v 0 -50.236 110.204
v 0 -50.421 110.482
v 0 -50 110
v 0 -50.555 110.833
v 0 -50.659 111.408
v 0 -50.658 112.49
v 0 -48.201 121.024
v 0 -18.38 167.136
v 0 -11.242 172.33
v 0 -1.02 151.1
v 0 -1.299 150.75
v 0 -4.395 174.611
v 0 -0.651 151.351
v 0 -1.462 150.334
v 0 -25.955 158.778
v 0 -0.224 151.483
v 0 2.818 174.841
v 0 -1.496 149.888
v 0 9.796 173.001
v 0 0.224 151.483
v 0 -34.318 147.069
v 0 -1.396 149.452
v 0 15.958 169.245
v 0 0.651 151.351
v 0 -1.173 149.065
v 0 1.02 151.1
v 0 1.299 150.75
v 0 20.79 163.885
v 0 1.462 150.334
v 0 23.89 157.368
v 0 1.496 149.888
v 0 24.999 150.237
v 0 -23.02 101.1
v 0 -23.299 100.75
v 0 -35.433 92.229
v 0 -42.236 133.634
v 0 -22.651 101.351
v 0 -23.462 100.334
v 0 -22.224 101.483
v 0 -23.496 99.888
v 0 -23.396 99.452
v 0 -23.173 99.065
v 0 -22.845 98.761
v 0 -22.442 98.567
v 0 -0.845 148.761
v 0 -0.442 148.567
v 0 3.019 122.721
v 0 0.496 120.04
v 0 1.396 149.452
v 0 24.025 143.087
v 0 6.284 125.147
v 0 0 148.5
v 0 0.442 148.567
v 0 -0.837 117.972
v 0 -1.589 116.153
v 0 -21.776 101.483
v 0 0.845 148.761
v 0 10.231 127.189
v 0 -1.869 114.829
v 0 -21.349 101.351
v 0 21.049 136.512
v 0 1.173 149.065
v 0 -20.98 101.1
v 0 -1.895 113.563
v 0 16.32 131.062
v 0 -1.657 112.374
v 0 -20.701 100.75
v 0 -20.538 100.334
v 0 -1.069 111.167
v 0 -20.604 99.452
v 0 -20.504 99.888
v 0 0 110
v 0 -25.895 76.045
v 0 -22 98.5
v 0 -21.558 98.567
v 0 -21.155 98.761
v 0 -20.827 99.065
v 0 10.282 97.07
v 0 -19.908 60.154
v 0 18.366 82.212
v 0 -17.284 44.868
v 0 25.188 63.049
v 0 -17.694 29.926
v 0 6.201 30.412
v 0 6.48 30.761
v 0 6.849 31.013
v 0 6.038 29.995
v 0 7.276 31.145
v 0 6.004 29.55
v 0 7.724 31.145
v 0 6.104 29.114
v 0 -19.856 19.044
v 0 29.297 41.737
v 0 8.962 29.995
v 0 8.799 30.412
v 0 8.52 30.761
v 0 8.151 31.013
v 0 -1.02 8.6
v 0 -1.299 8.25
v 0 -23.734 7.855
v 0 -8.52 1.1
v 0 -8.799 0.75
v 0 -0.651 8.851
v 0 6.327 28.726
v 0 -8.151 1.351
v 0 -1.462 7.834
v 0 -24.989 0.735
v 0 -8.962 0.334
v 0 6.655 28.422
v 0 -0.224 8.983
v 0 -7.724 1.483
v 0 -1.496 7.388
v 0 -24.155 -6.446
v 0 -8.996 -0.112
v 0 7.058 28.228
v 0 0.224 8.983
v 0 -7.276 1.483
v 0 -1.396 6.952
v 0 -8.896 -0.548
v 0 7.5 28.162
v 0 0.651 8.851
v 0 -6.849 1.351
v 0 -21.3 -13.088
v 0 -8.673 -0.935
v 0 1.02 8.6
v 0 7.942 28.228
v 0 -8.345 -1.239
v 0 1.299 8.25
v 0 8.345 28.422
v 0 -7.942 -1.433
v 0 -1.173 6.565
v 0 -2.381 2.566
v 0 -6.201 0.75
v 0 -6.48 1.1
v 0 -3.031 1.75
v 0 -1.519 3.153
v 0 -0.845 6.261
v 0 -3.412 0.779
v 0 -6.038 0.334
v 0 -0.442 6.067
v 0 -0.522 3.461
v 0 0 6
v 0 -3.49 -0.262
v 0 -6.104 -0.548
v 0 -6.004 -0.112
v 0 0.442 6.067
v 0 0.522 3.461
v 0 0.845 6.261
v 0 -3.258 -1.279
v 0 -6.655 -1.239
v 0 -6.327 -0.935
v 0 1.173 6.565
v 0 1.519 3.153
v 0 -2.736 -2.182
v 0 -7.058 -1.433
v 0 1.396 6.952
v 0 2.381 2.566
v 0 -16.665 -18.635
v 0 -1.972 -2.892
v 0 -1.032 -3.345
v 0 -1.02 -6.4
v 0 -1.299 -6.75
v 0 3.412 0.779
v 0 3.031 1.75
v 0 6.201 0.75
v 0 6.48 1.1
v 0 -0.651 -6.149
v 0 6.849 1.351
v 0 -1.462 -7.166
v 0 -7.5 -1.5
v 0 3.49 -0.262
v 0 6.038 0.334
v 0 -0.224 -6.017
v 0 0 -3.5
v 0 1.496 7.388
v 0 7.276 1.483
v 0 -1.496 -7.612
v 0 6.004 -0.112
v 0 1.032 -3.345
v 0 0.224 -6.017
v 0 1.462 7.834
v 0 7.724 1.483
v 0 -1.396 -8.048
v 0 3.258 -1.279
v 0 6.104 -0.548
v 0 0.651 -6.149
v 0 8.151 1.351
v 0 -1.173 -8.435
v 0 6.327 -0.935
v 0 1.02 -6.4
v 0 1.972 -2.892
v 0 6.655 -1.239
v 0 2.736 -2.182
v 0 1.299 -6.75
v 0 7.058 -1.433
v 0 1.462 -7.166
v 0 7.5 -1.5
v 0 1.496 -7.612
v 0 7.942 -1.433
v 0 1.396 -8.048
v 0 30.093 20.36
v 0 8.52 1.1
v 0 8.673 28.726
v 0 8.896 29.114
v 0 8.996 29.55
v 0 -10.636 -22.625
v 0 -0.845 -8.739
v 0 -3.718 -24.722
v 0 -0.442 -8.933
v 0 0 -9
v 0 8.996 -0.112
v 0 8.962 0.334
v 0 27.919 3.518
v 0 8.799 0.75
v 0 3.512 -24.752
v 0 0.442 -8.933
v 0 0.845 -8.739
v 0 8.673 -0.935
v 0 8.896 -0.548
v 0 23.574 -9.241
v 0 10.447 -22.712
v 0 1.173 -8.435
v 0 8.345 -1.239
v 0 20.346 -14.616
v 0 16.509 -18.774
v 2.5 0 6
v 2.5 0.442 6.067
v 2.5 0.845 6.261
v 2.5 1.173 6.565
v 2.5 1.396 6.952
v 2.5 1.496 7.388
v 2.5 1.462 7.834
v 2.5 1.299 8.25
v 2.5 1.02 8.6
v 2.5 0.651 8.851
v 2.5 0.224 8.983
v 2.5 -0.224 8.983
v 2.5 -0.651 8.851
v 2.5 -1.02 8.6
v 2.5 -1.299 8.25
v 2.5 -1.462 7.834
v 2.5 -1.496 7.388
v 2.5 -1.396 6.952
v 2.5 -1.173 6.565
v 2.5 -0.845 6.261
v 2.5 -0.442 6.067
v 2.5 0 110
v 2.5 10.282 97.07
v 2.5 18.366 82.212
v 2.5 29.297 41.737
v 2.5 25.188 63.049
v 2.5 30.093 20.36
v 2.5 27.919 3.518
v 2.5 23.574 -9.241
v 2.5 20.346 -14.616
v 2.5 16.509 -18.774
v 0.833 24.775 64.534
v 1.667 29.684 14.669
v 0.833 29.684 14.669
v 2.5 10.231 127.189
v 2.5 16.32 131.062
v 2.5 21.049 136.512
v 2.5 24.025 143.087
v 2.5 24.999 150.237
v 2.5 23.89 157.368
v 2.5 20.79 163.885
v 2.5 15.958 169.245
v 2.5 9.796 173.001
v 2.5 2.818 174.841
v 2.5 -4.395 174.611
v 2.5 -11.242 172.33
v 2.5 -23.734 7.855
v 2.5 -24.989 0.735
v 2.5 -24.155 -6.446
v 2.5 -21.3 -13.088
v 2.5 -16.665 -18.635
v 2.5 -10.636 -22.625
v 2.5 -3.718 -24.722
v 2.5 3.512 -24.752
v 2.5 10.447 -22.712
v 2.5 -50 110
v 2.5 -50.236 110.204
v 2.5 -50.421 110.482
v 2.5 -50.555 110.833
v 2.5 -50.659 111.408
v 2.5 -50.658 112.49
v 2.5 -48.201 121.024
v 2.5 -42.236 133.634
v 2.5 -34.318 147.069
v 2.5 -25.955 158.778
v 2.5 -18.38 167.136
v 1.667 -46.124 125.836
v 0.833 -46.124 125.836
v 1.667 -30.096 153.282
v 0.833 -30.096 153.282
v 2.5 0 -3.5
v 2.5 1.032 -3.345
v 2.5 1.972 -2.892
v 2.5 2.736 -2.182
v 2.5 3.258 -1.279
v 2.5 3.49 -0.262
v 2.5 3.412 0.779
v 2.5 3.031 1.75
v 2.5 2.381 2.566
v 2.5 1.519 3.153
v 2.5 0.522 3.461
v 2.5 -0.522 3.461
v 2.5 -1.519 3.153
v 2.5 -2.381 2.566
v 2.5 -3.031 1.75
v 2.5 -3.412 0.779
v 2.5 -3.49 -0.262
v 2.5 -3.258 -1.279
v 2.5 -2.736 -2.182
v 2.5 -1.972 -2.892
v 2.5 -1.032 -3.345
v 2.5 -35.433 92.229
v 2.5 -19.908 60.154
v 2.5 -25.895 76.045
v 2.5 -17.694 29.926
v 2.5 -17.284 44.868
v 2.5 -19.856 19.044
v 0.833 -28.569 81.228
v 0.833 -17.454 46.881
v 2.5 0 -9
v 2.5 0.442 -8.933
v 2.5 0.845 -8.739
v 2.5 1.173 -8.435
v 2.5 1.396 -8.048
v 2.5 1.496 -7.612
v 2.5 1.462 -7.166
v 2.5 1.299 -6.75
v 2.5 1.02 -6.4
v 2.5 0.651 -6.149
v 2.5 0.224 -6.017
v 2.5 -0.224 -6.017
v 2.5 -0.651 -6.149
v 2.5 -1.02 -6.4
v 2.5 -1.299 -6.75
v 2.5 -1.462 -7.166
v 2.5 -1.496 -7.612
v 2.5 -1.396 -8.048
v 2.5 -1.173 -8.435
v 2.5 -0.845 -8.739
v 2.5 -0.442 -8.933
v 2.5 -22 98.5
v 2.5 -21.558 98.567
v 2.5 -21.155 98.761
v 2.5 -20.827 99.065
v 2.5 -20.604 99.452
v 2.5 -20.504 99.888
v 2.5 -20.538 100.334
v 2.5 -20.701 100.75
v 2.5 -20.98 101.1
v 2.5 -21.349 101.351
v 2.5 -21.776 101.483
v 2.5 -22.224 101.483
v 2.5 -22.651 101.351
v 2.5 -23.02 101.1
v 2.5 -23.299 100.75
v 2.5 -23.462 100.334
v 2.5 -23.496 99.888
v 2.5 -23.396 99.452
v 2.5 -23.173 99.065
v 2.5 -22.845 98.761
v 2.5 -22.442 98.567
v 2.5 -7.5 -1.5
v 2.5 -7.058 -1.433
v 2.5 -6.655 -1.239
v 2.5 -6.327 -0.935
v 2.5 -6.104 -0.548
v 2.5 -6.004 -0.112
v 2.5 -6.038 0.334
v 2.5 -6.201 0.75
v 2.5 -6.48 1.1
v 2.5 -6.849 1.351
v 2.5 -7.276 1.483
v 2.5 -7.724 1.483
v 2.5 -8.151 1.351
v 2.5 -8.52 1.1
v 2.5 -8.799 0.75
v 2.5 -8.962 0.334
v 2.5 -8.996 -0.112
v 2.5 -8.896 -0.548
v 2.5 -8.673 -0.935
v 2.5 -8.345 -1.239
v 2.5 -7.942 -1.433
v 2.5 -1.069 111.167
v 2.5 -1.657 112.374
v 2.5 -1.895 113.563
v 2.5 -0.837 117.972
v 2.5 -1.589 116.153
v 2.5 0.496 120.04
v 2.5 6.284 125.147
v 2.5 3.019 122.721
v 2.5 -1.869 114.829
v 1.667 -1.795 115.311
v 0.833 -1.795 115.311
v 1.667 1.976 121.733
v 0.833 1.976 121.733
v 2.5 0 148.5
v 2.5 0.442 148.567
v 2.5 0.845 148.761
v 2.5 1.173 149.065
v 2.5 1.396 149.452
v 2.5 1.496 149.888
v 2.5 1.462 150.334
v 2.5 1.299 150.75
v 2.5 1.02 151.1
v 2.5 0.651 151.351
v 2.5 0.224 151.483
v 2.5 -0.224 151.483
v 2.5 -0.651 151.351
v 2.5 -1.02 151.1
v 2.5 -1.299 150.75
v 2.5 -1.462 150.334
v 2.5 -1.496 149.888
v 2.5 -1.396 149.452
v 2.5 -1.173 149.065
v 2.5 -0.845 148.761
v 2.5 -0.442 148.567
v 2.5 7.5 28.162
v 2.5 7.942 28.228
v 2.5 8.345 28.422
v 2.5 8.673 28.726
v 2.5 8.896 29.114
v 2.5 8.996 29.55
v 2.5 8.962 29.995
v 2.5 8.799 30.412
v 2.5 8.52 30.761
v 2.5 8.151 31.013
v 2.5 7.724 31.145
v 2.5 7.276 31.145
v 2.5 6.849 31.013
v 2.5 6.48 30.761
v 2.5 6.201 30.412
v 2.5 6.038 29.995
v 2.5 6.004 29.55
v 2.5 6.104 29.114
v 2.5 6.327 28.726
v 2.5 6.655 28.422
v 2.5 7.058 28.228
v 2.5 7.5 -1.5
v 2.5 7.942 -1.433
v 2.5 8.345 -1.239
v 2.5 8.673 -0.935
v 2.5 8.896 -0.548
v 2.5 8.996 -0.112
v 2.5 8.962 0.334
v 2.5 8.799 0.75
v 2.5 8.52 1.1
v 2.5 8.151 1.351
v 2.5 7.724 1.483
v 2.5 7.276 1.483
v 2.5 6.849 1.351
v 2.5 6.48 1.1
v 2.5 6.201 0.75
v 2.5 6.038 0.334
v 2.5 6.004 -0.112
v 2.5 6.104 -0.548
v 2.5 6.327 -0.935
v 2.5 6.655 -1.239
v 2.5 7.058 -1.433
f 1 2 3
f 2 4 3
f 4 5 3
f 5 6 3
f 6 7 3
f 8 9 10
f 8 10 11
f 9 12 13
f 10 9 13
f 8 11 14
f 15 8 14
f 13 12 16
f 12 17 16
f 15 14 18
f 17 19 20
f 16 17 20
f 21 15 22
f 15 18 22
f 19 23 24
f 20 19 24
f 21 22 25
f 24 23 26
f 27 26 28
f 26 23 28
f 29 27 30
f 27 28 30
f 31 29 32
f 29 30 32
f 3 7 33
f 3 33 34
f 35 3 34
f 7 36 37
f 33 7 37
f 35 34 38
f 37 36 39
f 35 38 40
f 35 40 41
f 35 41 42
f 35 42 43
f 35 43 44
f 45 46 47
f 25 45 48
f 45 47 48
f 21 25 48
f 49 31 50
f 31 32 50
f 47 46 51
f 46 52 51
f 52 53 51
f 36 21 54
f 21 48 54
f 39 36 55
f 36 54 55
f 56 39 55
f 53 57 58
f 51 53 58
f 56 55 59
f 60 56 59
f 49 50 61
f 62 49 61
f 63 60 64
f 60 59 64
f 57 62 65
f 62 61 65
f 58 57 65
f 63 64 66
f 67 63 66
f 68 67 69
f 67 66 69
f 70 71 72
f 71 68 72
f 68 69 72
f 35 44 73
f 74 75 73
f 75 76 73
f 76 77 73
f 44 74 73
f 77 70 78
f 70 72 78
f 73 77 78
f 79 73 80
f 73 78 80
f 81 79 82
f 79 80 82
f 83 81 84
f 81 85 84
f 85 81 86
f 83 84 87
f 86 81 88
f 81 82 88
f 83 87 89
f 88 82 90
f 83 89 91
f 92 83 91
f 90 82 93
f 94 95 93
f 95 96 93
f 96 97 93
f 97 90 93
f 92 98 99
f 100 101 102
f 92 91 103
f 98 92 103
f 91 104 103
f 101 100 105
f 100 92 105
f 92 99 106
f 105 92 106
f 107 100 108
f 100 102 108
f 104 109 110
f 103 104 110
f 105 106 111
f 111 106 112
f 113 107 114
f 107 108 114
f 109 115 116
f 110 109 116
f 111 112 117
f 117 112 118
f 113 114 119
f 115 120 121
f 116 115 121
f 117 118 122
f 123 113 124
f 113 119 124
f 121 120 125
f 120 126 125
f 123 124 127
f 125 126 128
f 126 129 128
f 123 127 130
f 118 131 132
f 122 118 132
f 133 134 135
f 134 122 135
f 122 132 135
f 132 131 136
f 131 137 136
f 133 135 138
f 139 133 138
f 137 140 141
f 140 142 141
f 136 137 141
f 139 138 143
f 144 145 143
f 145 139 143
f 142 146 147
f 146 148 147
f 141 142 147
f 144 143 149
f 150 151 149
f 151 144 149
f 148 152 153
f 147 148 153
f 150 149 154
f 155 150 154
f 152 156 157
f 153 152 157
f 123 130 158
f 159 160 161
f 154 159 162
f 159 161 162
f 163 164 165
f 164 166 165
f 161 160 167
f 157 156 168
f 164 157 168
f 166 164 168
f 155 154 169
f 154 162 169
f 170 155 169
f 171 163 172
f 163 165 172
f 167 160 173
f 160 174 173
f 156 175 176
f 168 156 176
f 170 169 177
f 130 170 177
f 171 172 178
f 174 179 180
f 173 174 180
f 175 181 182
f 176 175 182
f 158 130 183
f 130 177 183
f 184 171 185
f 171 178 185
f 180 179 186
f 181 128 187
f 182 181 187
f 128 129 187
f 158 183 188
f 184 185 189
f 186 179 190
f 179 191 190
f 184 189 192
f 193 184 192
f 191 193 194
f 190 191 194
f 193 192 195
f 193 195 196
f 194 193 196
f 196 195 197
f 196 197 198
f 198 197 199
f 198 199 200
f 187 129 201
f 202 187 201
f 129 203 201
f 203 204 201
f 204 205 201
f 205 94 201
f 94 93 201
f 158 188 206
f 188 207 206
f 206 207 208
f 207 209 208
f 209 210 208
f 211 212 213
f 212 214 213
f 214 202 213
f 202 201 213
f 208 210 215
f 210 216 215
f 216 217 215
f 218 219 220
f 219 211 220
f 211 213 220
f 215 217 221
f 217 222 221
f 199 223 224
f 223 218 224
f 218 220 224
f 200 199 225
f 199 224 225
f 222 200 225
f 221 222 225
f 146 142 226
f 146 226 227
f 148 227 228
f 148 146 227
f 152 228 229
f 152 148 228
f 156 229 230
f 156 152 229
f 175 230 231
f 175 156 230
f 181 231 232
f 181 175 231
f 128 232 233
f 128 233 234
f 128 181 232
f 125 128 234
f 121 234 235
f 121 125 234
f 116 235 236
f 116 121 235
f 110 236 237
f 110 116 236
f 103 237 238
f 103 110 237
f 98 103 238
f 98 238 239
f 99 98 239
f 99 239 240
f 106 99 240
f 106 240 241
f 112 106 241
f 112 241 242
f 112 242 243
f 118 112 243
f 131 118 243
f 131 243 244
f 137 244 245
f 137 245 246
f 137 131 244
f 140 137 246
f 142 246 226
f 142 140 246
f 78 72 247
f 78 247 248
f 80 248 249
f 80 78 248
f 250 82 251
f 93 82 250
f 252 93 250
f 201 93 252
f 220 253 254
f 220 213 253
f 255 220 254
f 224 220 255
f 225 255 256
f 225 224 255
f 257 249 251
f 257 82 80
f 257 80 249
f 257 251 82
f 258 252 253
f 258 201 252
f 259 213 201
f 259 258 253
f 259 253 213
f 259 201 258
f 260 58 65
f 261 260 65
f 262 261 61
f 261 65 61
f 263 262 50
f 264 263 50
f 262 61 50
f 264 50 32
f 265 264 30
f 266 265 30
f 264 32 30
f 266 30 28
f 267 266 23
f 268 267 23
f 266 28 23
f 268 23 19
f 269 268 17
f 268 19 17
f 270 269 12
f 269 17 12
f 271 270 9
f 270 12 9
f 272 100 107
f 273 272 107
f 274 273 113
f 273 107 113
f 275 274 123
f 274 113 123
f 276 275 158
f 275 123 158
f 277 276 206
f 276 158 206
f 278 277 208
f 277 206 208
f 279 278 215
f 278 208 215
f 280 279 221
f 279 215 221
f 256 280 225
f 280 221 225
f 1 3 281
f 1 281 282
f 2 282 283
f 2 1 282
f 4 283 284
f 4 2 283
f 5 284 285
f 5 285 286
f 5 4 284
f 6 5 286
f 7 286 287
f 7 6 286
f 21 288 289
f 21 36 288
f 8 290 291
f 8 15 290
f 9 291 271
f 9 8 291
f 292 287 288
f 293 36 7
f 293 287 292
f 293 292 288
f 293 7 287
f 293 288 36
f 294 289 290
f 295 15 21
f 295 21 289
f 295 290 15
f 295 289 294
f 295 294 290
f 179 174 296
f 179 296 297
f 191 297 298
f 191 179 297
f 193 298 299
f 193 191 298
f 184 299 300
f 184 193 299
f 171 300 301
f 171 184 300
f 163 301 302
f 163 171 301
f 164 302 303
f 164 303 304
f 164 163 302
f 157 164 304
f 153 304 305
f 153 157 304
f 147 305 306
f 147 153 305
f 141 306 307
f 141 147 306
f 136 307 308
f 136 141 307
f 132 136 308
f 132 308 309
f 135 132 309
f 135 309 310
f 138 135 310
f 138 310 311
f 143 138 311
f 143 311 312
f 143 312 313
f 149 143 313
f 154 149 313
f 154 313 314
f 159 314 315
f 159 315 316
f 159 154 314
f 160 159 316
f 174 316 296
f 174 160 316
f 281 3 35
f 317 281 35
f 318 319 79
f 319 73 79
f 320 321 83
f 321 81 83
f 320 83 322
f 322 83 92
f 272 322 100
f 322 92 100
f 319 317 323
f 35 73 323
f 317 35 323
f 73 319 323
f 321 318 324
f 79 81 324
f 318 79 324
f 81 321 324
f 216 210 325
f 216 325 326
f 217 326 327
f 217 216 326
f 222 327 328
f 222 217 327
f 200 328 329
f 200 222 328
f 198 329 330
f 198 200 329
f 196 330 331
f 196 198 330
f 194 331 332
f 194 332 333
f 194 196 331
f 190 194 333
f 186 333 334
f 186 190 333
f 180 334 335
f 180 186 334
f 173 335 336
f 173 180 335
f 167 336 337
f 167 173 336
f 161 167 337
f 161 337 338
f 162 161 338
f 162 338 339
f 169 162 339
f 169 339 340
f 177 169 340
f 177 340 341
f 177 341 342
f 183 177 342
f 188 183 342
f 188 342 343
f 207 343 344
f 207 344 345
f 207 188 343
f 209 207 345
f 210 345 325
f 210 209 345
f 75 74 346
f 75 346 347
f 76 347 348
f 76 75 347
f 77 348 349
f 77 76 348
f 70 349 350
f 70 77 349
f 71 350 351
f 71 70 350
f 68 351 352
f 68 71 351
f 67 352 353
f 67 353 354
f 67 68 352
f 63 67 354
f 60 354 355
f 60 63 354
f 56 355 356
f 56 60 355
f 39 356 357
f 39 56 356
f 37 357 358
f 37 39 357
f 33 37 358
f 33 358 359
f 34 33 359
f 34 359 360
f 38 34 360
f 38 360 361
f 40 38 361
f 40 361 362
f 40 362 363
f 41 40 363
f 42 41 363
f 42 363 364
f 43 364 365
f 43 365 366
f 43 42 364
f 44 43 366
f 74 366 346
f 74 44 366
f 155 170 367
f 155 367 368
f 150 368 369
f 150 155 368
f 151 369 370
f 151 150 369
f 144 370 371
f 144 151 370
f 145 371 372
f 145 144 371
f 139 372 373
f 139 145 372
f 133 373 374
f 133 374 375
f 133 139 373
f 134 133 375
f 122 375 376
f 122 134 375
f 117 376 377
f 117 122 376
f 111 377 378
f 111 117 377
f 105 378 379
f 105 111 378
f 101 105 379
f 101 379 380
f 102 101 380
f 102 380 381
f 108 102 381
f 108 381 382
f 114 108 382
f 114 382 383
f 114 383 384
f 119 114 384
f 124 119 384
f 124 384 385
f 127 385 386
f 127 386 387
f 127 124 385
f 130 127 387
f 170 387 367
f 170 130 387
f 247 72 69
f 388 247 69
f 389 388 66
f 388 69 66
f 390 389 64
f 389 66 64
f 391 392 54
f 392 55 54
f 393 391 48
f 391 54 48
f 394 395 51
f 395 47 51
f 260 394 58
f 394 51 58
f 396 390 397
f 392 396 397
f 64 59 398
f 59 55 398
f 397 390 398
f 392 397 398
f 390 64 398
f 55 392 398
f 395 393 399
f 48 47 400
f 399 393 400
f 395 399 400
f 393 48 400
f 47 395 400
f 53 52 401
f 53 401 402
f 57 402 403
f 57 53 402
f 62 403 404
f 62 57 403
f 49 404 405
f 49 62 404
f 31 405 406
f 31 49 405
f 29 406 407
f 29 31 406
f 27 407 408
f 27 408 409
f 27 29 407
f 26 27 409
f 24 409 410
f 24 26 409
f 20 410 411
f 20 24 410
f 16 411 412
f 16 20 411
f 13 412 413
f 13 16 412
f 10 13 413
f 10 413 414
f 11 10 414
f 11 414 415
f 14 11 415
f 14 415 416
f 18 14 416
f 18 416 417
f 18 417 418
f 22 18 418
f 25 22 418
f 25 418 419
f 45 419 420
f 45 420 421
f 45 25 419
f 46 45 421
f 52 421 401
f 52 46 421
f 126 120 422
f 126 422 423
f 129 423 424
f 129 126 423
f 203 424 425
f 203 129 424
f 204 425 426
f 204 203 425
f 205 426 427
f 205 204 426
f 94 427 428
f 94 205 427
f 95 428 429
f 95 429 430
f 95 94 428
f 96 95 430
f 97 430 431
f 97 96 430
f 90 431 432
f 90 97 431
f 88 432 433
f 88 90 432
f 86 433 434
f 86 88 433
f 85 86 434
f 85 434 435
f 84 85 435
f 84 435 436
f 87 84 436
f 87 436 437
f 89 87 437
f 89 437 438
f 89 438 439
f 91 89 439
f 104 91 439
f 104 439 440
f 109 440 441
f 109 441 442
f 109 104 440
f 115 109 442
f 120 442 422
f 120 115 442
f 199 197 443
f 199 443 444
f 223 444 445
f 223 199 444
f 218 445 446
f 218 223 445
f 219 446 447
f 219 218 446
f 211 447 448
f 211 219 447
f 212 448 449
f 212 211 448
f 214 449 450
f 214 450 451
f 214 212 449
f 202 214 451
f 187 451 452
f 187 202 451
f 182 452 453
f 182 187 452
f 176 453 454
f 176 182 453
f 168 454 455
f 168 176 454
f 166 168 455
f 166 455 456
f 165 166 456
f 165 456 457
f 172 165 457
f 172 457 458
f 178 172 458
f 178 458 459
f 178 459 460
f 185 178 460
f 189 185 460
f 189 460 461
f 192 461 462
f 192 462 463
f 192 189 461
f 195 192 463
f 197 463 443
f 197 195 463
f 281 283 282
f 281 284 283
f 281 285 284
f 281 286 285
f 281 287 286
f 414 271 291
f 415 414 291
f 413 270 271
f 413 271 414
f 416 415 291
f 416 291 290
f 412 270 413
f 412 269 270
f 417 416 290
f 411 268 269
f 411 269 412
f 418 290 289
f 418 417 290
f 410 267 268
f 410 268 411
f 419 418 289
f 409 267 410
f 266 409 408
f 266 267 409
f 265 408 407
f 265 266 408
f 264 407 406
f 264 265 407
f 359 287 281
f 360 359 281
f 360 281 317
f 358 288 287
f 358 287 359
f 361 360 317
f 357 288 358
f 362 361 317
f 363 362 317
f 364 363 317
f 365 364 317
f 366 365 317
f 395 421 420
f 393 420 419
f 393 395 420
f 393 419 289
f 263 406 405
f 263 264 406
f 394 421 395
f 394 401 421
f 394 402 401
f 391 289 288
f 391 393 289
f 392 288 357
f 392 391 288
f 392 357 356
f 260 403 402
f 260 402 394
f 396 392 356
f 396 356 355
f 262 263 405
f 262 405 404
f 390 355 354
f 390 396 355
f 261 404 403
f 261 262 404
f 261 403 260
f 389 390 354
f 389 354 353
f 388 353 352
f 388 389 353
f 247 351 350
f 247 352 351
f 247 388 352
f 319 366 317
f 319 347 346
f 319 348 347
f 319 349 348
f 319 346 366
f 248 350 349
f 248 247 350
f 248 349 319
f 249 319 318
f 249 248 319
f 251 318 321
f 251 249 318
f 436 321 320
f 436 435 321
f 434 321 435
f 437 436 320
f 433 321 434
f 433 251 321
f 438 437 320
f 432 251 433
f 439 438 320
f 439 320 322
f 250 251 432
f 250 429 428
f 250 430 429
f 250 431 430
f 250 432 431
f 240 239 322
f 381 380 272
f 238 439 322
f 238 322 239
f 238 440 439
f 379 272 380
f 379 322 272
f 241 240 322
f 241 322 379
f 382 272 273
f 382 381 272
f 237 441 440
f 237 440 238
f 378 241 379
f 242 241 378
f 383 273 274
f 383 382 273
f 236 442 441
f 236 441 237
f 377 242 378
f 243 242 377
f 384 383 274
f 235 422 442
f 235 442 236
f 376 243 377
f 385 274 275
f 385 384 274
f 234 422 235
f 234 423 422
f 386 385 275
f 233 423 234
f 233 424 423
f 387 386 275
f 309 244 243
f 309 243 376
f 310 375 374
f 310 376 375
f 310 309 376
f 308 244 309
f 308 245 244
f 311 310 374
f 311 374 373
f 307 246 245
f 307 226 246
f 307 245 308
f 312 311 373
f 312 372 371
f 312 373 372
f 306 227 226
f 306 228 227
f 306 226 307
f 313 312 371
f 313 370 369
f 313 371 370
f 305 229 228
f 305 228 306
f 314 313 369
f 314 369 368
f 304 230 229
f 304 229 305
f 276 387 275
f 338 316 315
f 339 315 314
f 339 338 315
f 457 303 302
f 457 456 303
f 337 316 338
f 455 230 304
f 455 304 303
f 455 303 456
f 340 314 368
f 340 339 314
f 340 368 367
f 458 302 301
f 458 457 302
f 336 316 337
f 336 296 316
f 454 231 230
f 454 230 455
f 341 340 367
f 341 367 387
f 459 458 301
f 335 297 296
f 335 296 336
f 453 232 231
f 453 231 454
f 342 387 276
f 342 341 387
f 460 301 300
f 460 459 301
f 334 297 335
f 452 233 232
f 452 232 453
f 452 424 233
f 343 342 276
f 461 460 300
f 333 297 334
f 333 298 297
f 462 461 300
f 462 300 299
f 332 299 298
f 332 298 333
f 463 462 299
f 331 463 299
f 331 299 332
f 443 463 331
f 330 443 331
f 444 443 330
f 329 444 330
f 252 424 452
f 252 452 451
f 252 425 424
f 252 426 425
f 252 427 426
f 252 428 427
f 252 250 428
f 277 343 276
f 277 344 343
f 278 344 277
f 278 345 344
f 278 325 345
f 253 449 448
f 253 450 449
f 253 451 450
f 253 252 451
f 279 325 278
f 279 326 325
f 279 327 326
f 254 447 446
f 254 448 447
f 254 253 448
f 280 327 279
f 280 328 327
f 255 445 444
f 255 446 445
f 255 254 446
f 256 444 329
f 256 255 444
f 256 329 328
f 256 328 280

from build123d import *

# Parameters (mm, degrees)
CROQUIS1_R              = 1.5
CROQUIS1_R_2            = 3.5
SALIENTE_EXTRUIR1_DEPTH = 2.5


with BuildPart() as part:
    # Croquis1 → Saliente-Extruir1 (new body)
    with BuildSketch(Plane(origin=(0, 0, 0), x_dir=(0, 0, -1), z_dir=(1, 0, 0))):
        with BuildLine():
            ThreePointArc((-7.85459709, -23.73405369), (20.849117368, -13.795445081), (18.773557908, 16.509195119))
            add(Edge.make_bspline(
                [(-110, 0), (-73.673662094, 35.301314783), (0.482929837, 38.132802583), (18.773557908, 16.509195119)],
                knots=[0, 0, 0, 0, 1, 1, 1, 1], degree=3))
            add(Edge.make_bspline(
                [(-110, 0), (-114.062747325, -4.939612892), (-122.908484161, 0.095903893), (-127.189106422, 10.230500191)],
                knots=[0, 0, 0, 0, 1, 1, 1, 1], degree=3))
            ThreePointArc((-127.189106422, 10.230500191), (-160.738730688, 22.576086092), (-172.329956868, -11.241575792))
            add(Edge.make_bspline(
                [(-110, -50), (-113.363085111, -55.309529938), (-164.148966012, -28.400175315), (-172.329956868, -11.241575792)],
                knots=[0, 0, 0, 0, 1, 1, 1, 1], degree=3))
            add(Edge.make_bspline(
                [(-110, -50), (-84.313279839, -25.770287147), (-48.9234642, -6.39735454), (-7.85459709, -23.73405369)],
                knots=[0, 0, 0, 0, 1, 1, 1, 1], degree=3))
        make_face()
        with Locations((-150, 0)):
            Circle(CROQUIS1_R, mode=Mode.SUBTRACT)
        Circle(CROQUIS1_R_2, mode=Mode.SUBTRACT)
        with Locations((-29.661618982, 7.5)):
            Circle(CROQUIS1_R, mode=Mode.SUBTRACT)
        with Locations((-7.5, 0)):
            Circle(CROQUIS1_R, mode=Mode.SUBTRACT)
        with Locations((0, -7.5)):
            Circle(CROQUIS1_R, mode=Mode.SUBTRACT)
        with Locations((0, 7.5)):
            Circle(CROQUIS1_R, mode=Mode.SUBTRACT)
        with Locations((7.5, 0)):
            Circle(CROQUIS1_R, mode=Mode.SUBTRACT)
        with Locations((-100, -22)):
            Circle(CROQUIS1_R, mode=Mode.SUBTRACT)
    extrude(amount=SALIENTE_EXTRUIR1_DEPTH)


solid = part.part
